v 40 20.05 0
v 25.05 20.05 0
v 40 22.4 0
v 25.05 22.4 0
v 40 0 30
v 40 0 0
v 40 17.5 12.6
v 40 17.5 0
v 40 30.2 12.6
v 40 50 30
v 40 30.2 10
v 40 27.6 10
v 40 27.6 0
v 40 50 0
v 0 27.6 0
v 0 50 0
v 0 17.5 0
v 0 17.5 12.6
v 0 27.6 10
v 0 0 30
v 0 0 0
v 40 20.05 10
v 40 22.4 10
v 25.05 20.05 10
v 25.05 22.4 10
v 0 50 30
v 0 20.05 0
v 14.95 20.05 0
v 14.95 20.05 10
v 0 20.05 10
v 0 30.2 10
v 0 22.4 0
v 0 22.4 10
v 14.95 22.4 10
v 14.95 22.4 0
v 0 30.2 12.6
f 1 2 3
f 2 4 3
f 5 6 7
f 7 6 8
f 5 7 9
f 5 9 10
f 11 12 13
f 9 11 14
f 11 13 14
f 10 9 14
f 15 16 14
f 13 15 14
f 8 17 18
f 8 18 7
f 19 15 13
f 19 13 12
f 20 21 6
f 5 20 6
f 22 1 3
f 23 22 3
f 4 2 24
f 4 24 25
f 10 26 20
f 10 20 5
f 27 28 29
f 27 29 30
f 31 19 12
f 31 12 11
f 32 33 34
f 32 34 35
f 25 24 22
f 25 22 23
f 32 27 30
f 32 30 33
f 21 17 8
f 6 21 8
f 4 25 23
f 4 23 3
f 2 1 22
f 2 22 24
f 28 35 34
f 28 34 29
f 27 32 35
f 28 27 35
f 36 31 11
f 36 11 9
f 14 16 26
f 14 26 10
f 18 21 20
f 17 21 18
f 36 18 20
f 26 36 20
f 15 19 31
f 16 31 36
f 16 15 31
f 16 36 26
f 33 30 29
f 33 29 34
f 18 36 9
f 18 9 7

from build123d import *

# Parameters (mm, degrees)
SKETCH1_W           = 40
SKETCH1_H           = 50
BOSS_EXTRUDE1_DEPTH = 30
CUT_EXTRUDE1_REACH  = 72.711
CUT_EXTRUDE2_REACH  = 72.711


with BuildPart() as part:
    # Sketch1 → Boss-Extrude1 (new body)
    with BuildSketch(Plane.XY):
        with Locations((20, 25)):
            Rectangle(SKETCH1_W, SKETCH1_H)
    extrude(amount=BOSS_EXTRUDE1_DEPTH)

    # Sketch2 → Cut-Extrude1 (cut, up to next)
    with BuildSketch(Plane.ZY, mode=Mode.PRIVATE) as cut_extrude1_sk1:
        Polygon((0, 27.6), (10, 27.6), (10, 30.2), (12.6, 30.2), (12.6, 19.8), (10, 19.8), (10, 22.4), (0, 22.4), align=None)
    cut_extrude1_tool1 = extrude(cut_extrude1_sk1.sketch, amount=-CUT_EXTRUDE1_REACH, mode=Mode.PRIVATE) & part.part
    add(cut_extrude1_tool1.solids().sort_by_distance((0, 25, 7.155263))[0], mode=Mode.SUBTRACT)

    # Cut-Extrude2: up to this face of the body (flat: up to its plane)
    cut_extrude2_end = Plane(part.part.faces().sort_by_distance((20, 25, 12.6))[0])
    # Sketch3 → Cut-Extrude2 (cut, up to the picked face)
    with BuildSketch(Plane(origin=(0, 0, 0), x_dir=(-1, 0, 0), z_dir=(0, 0, -1)), mode=Mode.PRIVATE) as cut_extrude2_sk1:
        Polygon((-25.05, 27.6), (-14.95, 27.6), (-14.95, 20.05), (0, 20.05), (0, 17.5), (-40, 17.5), (-40, 20.05), (-25.05, 20.05), align=None)
    cut_extrude2_tool1 = split(extrude(cut_extrude2_sk1.sketch, amount=-CUT_EXTRUDE2_REACH, mode=Mode.PRIVATE), bisect_by=cut_extrude2_end, keep=Keep.BOTH, mode=Mode.PRIVATE)
    add(cut_extrude2_tool1.solids().sort_by(Axis((20, 20.935319, 0), (0, 0, 1)))[0], mode=Mode.SUBTRACT)


with BuildPart() as cut_extrude2_piece_1:
    # of the separate pieces the step leaves, piece 1, a body of its own (cut_extrude2_pieces)
    add(part.part.solids().sort_by_distance((0, 0, 0))[0])


with BuildPart() as cut_extrude2_piece_2:
    # of the separate pieces the step leaves, piece 2, a body of its own (cut_extrude2_pieces)
    add(part.part.solids().sort_by_distance((0, 20.05, 0))[0])


with BuildPart() as cut_extrude2_piece_3:
    # of the separate pieces the step leaves, piece 3, a body of its own (cut_extrude2_pieces)
    add(part.part.solids().sort_by_distance((40, 20.05, 0))[0])


solid = Compound([cut_extrude2_piece_1.part, cut_extrude2_piece_2.part, cut_extrude2_piece_3.part])
